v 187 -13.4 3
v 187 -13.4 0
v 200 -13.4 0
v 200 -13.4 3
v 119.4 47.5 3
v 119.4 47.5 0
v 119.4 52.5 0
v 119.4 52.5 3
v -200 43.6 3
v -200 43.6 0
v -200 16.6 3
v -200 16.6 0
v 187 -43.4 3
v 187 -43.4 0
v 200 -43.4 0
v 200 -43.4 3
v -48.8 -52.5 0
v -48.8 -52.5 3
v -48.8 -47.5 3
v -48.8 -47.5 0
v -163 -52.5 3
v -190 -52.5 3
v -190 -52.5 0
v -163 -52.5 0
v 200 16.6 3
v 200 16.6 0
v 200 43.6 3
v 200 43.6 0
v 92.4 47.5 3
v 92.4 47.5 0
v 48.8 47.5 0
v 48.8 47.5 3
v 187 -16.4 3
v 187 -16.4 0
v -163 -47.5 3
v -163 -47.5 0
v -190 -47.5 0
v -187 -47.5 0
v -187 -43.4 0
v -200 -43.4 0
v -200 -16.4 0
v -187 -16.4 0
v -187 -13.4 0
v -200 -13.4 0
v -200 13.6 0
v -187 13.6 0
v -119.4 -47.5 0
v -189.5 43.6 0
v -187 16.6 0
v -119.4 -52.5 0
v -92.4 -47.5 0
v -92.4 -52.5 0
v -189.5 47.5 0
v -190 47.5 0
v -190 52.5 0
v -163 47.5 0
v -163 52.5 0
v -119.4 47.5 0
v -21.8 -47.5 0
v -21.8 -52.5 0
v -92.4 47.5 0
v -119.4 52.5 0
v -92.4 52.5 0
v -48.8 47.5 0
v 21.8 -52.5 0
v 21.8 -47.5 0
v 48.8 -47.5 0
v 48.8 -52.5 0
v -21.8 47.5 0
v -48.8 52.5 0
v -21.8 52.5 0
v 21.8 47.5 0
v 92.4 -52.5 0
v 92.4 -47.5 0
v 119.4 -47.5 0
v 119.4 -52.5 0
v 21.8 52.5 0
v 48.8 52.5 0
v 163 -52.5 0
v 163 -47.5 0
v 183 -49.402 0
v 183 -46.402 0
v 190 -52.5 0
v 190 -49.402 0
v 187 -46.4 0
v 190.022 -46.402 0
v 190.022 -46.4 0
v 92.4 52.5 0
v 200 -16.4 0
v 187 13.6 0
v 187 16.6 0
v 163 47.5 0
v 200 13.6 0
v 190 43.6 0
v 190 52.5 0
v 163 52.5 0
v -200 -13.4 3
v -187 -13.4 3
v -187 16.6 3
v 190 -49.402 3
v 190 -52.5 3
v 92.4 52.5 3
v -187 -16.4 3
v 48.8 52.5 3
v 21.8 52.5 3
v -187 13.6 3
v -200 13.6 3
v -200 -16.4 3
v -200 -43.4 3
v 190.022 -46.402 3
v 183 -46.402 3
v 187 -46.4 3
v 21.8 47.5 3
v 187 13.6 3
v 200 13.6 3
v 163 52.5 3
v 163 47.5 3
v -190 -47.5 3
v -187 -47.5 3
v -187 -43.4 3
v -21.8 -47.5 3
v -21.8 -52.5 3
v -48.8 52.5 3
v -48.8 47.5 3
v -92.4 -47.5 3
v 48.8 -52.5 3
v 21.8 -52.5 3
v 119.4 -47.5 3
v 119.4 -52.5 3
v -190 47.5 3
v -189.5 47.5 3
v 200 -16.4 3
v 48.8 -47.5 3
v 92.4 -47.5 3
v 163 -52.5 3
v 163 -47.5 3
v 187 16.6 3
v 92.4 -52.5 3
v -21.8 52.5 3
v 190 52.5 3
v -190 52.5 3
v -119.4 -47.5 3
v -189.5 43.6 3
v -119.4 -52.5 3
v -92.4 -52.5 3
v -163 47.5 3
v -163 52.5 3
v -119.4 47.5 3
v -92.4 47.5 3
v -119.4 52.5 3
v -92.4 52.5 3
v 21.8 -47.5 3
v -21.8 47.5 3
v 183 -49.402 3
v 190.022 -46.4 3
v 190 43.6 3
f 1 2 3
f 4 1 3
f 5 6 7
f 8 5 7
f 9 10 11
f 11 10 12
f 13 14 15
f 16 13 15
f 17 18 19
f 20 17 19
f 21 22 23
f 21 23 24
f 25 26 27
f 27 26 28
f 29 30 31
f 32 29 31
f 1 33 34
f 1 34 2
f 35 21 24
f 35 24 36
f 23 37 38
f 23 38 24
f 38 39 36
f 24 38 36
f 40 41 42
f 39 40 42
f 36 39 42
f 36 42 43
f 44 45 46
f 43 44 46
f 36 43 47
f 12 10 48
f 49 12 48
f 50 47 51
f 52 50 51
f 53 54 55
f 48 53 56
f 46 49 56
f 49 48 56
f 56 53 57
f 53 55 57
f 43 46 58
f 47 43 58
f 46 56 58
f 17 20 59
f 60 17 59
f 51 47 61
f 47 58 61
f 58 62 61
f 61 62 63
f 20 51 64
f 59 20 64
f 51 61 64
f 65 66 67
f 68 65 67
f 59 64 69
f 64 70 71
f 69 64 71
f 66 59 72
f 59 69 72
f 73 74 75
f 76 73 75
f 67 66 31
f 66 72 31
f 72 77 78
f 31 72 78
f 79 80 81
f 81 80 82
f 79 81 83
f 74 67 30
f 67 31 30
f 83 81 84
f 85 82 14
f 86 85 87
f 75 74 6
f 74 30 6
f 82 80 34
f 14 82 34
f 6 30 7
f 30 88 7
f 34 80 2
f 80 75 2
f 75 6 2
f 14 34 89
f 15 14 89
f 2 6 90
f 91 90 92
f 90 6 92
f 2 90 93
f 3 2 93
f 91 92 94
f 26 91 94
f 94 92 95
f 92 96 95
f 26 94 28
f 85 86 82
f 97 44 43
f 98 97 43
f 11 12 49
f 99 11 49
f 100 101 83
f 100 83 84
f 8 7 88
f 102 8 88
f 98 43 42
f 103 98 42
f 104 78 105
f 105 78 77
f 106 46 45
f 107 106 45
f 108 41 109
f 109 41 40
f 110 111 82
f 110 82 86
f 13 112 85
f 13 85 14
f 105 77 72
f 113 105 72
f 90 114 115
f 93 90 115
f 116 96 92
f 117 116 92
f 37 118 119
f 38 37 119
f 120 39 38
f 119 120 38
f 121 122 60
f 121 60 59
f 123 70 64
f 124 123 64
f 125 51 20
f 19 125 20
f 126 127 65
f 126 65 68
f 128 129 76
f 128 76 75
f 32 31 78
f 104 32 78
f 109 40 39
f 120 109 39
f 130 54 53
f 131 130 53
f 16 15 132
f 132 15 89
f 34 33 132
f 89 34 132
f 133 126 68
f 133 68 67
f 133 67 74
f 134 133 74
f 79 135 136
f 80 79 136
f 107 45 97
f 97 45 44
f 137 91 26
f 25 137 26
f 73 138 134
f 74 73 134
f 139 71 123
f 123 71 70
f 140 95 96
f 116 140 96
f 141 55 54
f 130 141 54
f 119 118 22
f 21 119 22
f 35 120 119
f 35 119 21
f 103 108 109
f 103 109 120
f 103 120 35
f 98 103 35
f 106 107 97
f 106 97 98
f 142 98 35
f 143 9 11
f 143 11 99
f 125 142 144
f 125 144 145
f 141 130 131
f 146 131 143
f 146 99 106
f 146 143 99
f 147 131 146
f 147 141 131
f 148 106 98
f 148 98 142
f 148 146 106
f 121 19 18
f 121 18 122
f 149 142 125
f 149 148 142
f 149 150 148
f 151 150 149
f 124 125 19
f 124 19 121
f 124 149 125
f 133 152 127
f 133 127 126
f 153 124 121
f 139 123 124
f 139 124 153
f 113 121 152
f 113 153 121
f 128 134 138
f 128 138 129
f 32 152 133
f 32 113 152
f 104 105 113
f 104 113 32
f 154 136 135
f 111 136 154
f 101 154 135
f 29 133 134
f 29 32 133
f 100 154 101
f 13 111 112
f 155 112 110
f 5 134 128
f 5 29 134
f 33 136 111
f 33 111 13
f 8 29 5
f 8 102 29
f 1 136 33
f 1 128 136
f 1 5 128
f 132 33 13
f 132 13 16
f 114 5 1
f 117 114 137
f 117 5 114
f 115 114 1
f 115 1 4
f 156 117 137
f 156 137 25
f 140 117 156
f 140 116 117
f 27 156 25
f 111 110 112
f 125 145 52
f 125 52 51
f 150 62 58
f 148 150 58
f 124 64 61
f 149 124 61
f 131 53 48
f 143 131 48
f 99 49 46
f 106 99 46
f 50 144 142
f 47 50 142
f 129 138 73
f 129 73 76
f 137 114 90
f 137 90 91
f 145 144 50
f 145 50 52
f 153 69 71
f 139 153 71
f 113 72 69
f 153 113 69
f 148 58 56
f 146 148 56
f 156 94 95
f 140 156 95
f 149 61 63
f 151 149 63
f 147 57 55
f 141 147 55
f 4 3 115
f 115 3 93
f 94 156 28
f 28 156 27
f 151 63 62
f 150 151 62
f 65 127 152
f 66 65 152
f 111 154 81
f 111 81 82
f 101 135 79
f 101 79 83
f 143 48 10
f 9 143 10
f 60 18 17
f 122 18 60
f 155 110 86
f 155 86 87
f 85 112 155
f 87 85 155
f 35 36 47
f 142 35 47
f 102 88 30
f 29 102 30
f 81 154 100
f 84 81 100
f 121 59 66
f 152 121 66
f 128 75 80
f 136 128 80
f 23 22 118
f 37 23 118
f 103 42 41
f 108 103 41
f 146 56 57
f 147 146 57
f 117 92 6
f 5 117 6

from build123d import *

# Parameters (mm, degrees)
BOSS_EXTRUDE1_DEPTH = 3
SKETCH3_W           = 27
SKETCH3_H           = 5
BOSS_EXTRUDE2_DEPTH = 3
SKETCH4_W           = 8
SKETCH4_H           = 3
CUT_EXTRUDE1_DEPTH  = 3
SKETCH5_W           = 5
SKETCH5_H           = 3.9
CUT_EXTRUDE2_DEPTH  = 3
SKETCH6_W           = 5
SKETCH6_H           = 4.739085619
CUT_EXTRUDE3_DEPTH  = 3
SKETCH7_W           = 7
SKETCH7_H           = 3
CUT_EXTRUDE5_DEPTH  = 3
SKETCH8_W           = 4.245961236
SKETCH8_H           = 1.503952676
CUT_EXTRUDE6_DEPTH  = 10


# Read off the part's stored shape, not the designer's step: Boss-Extrude1
with BuildPart() as part:
    # Boss-Extrude1 outline → Boss-Extrude1 (new body)
    with BuildSketch(Plane.XY):
        Polygon((195, -43.4), (200, -43.4), (200, -16.4), (195, -16.4), (195, -13.4), (200, -13.4), (200, 13.6), (195, 13.6), (195, 16.6), (200, 16.6), (200, 43.6), (195, 43.6), (195, 47.5), (190, 47.5), (190, 52.5), (163, 52.5), (163, 47.5), (119.4, 47.5), (119.4, 52.5), (92.4, 52.5), (92.4, 47.5), (48.8, 47.5), (48.8, 52.5), (21.8, 52.5), (21.8, 47.5), (-21.8, 47.5), (-21.8, 52.5), (-48.8, 52.5), (-48.8, 47.5), (-92.4, 47.5), (-92.4, 52.5), (-119.4, 52.5), (-119.4, 47.5), (-163, 47.5), (-163, 52.5), (-190, 52.5), (-190, 47.5), (-189.5, 47.5), (-189.5, 43.6), (-200, 43.6), (-200, 16.6), (-187, 16.6), (-187, 13.6), (-200, 13.6), (-200, -13.4), (-187, -13.4), (-187, -16.4), (-200, -16.4), (-200, -43.4), (-187, -43.4), (-187, -47.5), (195, -47.5), align=None)
    extrude(amount=BOSS_EXTRUDE1_DEPTH)

    # Sketch3 → Boss-Extrude2 (add)
    with BuildSketch(Plane.XY.offset(3)):
        with Locations((-176.5, -50)):
            Rectangle(SKETCH3_W, SKETCH3_H)
        with Locations((-105.9, -50)):
            Rectangle(SKETCH3_W, SKETCH3_H)
        with Locations((-35.3, -50)):
            Rectangle(SKETCH3_W, SKETCH3_H)
        with Locations((35.3, -50)):
            Rectangle(SKETCH3_W, SKETCH3_H)
        with Locations((105.9, -50)):
            Rectangle(SKETCH3_W, SKETCH3_H)
        with Locations((176.5, -50)):
            Rectangle(SKETCH3_W, SKETCH3_H)
    extrude(amount=-BOSS_EXTRUDE2_DEPTH)

    # Sketch4 → Cut-Extrude1 (cut)
    with BuildSketch(Plane.XY.offset(3)):
        with Locations((191, -14.9)):
            Rectangle(SKETCH4_W, SKETCH4_H)
        with Locations((191, 15.1)):
            Rectangle(SKETCH4_W, SKETCH4_H)
        with Locations((191, -44.9)):
            Rectangle(SKETCH4_W, SKETCH4_H)
    extrude(amount=-CUT_EXTRUDE1_DEPTH, mode=Mode.SUBTRACT)

    # Sketch5 → Cut-Extrude2 (cut)
    with BuildSketch(Plane.XY.offset(3)):
        with Locations((192.5, 45.55)):
            Rectangle(SKETCH5_W, SKETCH5_H)
    extrude(amount=-CUT_EXTRUDE2_DEPTH, mode=Mode.SUBTRACT)

    # Sketch6 → Cut-Extrude3 (cut)
    with BuildSketch(Plane.XY.offset(3)):
        with Locations((192.522405585, -47.571722604)):
            Rectangle(SKETCH6_W, SKETCH6_H)
    extrude(amount=-CUT_EXTRUDE3_DEPTH, mode=Mode.SUBTRACT)

    # Sketch7 → Cut-Extrude5 (cut)
    with BuildSketch(Plane.XY.offset(3)):
        with Locations((186.5, -47.902198406)):
            Rectangle(SKETCH7_W, SKETCH7_H)
    extrude(amount=-CUT_EXTRUDE5_DEPTH, mode=Mode.SUBTRACT)

    # Sketch8 → Cut-Extrude6 (cut)
    with BuildSketch(Plane.XY.offset(3)):
        with Locations((189.30979268, -47.154174744)):
            Rectangle(SKETCH8_W, SKETCH8_H)
    extrude(amount=-CUT_EXTRUDE6_DEPTH, mode=Mode.SUBTRACT)


solid = part.part
